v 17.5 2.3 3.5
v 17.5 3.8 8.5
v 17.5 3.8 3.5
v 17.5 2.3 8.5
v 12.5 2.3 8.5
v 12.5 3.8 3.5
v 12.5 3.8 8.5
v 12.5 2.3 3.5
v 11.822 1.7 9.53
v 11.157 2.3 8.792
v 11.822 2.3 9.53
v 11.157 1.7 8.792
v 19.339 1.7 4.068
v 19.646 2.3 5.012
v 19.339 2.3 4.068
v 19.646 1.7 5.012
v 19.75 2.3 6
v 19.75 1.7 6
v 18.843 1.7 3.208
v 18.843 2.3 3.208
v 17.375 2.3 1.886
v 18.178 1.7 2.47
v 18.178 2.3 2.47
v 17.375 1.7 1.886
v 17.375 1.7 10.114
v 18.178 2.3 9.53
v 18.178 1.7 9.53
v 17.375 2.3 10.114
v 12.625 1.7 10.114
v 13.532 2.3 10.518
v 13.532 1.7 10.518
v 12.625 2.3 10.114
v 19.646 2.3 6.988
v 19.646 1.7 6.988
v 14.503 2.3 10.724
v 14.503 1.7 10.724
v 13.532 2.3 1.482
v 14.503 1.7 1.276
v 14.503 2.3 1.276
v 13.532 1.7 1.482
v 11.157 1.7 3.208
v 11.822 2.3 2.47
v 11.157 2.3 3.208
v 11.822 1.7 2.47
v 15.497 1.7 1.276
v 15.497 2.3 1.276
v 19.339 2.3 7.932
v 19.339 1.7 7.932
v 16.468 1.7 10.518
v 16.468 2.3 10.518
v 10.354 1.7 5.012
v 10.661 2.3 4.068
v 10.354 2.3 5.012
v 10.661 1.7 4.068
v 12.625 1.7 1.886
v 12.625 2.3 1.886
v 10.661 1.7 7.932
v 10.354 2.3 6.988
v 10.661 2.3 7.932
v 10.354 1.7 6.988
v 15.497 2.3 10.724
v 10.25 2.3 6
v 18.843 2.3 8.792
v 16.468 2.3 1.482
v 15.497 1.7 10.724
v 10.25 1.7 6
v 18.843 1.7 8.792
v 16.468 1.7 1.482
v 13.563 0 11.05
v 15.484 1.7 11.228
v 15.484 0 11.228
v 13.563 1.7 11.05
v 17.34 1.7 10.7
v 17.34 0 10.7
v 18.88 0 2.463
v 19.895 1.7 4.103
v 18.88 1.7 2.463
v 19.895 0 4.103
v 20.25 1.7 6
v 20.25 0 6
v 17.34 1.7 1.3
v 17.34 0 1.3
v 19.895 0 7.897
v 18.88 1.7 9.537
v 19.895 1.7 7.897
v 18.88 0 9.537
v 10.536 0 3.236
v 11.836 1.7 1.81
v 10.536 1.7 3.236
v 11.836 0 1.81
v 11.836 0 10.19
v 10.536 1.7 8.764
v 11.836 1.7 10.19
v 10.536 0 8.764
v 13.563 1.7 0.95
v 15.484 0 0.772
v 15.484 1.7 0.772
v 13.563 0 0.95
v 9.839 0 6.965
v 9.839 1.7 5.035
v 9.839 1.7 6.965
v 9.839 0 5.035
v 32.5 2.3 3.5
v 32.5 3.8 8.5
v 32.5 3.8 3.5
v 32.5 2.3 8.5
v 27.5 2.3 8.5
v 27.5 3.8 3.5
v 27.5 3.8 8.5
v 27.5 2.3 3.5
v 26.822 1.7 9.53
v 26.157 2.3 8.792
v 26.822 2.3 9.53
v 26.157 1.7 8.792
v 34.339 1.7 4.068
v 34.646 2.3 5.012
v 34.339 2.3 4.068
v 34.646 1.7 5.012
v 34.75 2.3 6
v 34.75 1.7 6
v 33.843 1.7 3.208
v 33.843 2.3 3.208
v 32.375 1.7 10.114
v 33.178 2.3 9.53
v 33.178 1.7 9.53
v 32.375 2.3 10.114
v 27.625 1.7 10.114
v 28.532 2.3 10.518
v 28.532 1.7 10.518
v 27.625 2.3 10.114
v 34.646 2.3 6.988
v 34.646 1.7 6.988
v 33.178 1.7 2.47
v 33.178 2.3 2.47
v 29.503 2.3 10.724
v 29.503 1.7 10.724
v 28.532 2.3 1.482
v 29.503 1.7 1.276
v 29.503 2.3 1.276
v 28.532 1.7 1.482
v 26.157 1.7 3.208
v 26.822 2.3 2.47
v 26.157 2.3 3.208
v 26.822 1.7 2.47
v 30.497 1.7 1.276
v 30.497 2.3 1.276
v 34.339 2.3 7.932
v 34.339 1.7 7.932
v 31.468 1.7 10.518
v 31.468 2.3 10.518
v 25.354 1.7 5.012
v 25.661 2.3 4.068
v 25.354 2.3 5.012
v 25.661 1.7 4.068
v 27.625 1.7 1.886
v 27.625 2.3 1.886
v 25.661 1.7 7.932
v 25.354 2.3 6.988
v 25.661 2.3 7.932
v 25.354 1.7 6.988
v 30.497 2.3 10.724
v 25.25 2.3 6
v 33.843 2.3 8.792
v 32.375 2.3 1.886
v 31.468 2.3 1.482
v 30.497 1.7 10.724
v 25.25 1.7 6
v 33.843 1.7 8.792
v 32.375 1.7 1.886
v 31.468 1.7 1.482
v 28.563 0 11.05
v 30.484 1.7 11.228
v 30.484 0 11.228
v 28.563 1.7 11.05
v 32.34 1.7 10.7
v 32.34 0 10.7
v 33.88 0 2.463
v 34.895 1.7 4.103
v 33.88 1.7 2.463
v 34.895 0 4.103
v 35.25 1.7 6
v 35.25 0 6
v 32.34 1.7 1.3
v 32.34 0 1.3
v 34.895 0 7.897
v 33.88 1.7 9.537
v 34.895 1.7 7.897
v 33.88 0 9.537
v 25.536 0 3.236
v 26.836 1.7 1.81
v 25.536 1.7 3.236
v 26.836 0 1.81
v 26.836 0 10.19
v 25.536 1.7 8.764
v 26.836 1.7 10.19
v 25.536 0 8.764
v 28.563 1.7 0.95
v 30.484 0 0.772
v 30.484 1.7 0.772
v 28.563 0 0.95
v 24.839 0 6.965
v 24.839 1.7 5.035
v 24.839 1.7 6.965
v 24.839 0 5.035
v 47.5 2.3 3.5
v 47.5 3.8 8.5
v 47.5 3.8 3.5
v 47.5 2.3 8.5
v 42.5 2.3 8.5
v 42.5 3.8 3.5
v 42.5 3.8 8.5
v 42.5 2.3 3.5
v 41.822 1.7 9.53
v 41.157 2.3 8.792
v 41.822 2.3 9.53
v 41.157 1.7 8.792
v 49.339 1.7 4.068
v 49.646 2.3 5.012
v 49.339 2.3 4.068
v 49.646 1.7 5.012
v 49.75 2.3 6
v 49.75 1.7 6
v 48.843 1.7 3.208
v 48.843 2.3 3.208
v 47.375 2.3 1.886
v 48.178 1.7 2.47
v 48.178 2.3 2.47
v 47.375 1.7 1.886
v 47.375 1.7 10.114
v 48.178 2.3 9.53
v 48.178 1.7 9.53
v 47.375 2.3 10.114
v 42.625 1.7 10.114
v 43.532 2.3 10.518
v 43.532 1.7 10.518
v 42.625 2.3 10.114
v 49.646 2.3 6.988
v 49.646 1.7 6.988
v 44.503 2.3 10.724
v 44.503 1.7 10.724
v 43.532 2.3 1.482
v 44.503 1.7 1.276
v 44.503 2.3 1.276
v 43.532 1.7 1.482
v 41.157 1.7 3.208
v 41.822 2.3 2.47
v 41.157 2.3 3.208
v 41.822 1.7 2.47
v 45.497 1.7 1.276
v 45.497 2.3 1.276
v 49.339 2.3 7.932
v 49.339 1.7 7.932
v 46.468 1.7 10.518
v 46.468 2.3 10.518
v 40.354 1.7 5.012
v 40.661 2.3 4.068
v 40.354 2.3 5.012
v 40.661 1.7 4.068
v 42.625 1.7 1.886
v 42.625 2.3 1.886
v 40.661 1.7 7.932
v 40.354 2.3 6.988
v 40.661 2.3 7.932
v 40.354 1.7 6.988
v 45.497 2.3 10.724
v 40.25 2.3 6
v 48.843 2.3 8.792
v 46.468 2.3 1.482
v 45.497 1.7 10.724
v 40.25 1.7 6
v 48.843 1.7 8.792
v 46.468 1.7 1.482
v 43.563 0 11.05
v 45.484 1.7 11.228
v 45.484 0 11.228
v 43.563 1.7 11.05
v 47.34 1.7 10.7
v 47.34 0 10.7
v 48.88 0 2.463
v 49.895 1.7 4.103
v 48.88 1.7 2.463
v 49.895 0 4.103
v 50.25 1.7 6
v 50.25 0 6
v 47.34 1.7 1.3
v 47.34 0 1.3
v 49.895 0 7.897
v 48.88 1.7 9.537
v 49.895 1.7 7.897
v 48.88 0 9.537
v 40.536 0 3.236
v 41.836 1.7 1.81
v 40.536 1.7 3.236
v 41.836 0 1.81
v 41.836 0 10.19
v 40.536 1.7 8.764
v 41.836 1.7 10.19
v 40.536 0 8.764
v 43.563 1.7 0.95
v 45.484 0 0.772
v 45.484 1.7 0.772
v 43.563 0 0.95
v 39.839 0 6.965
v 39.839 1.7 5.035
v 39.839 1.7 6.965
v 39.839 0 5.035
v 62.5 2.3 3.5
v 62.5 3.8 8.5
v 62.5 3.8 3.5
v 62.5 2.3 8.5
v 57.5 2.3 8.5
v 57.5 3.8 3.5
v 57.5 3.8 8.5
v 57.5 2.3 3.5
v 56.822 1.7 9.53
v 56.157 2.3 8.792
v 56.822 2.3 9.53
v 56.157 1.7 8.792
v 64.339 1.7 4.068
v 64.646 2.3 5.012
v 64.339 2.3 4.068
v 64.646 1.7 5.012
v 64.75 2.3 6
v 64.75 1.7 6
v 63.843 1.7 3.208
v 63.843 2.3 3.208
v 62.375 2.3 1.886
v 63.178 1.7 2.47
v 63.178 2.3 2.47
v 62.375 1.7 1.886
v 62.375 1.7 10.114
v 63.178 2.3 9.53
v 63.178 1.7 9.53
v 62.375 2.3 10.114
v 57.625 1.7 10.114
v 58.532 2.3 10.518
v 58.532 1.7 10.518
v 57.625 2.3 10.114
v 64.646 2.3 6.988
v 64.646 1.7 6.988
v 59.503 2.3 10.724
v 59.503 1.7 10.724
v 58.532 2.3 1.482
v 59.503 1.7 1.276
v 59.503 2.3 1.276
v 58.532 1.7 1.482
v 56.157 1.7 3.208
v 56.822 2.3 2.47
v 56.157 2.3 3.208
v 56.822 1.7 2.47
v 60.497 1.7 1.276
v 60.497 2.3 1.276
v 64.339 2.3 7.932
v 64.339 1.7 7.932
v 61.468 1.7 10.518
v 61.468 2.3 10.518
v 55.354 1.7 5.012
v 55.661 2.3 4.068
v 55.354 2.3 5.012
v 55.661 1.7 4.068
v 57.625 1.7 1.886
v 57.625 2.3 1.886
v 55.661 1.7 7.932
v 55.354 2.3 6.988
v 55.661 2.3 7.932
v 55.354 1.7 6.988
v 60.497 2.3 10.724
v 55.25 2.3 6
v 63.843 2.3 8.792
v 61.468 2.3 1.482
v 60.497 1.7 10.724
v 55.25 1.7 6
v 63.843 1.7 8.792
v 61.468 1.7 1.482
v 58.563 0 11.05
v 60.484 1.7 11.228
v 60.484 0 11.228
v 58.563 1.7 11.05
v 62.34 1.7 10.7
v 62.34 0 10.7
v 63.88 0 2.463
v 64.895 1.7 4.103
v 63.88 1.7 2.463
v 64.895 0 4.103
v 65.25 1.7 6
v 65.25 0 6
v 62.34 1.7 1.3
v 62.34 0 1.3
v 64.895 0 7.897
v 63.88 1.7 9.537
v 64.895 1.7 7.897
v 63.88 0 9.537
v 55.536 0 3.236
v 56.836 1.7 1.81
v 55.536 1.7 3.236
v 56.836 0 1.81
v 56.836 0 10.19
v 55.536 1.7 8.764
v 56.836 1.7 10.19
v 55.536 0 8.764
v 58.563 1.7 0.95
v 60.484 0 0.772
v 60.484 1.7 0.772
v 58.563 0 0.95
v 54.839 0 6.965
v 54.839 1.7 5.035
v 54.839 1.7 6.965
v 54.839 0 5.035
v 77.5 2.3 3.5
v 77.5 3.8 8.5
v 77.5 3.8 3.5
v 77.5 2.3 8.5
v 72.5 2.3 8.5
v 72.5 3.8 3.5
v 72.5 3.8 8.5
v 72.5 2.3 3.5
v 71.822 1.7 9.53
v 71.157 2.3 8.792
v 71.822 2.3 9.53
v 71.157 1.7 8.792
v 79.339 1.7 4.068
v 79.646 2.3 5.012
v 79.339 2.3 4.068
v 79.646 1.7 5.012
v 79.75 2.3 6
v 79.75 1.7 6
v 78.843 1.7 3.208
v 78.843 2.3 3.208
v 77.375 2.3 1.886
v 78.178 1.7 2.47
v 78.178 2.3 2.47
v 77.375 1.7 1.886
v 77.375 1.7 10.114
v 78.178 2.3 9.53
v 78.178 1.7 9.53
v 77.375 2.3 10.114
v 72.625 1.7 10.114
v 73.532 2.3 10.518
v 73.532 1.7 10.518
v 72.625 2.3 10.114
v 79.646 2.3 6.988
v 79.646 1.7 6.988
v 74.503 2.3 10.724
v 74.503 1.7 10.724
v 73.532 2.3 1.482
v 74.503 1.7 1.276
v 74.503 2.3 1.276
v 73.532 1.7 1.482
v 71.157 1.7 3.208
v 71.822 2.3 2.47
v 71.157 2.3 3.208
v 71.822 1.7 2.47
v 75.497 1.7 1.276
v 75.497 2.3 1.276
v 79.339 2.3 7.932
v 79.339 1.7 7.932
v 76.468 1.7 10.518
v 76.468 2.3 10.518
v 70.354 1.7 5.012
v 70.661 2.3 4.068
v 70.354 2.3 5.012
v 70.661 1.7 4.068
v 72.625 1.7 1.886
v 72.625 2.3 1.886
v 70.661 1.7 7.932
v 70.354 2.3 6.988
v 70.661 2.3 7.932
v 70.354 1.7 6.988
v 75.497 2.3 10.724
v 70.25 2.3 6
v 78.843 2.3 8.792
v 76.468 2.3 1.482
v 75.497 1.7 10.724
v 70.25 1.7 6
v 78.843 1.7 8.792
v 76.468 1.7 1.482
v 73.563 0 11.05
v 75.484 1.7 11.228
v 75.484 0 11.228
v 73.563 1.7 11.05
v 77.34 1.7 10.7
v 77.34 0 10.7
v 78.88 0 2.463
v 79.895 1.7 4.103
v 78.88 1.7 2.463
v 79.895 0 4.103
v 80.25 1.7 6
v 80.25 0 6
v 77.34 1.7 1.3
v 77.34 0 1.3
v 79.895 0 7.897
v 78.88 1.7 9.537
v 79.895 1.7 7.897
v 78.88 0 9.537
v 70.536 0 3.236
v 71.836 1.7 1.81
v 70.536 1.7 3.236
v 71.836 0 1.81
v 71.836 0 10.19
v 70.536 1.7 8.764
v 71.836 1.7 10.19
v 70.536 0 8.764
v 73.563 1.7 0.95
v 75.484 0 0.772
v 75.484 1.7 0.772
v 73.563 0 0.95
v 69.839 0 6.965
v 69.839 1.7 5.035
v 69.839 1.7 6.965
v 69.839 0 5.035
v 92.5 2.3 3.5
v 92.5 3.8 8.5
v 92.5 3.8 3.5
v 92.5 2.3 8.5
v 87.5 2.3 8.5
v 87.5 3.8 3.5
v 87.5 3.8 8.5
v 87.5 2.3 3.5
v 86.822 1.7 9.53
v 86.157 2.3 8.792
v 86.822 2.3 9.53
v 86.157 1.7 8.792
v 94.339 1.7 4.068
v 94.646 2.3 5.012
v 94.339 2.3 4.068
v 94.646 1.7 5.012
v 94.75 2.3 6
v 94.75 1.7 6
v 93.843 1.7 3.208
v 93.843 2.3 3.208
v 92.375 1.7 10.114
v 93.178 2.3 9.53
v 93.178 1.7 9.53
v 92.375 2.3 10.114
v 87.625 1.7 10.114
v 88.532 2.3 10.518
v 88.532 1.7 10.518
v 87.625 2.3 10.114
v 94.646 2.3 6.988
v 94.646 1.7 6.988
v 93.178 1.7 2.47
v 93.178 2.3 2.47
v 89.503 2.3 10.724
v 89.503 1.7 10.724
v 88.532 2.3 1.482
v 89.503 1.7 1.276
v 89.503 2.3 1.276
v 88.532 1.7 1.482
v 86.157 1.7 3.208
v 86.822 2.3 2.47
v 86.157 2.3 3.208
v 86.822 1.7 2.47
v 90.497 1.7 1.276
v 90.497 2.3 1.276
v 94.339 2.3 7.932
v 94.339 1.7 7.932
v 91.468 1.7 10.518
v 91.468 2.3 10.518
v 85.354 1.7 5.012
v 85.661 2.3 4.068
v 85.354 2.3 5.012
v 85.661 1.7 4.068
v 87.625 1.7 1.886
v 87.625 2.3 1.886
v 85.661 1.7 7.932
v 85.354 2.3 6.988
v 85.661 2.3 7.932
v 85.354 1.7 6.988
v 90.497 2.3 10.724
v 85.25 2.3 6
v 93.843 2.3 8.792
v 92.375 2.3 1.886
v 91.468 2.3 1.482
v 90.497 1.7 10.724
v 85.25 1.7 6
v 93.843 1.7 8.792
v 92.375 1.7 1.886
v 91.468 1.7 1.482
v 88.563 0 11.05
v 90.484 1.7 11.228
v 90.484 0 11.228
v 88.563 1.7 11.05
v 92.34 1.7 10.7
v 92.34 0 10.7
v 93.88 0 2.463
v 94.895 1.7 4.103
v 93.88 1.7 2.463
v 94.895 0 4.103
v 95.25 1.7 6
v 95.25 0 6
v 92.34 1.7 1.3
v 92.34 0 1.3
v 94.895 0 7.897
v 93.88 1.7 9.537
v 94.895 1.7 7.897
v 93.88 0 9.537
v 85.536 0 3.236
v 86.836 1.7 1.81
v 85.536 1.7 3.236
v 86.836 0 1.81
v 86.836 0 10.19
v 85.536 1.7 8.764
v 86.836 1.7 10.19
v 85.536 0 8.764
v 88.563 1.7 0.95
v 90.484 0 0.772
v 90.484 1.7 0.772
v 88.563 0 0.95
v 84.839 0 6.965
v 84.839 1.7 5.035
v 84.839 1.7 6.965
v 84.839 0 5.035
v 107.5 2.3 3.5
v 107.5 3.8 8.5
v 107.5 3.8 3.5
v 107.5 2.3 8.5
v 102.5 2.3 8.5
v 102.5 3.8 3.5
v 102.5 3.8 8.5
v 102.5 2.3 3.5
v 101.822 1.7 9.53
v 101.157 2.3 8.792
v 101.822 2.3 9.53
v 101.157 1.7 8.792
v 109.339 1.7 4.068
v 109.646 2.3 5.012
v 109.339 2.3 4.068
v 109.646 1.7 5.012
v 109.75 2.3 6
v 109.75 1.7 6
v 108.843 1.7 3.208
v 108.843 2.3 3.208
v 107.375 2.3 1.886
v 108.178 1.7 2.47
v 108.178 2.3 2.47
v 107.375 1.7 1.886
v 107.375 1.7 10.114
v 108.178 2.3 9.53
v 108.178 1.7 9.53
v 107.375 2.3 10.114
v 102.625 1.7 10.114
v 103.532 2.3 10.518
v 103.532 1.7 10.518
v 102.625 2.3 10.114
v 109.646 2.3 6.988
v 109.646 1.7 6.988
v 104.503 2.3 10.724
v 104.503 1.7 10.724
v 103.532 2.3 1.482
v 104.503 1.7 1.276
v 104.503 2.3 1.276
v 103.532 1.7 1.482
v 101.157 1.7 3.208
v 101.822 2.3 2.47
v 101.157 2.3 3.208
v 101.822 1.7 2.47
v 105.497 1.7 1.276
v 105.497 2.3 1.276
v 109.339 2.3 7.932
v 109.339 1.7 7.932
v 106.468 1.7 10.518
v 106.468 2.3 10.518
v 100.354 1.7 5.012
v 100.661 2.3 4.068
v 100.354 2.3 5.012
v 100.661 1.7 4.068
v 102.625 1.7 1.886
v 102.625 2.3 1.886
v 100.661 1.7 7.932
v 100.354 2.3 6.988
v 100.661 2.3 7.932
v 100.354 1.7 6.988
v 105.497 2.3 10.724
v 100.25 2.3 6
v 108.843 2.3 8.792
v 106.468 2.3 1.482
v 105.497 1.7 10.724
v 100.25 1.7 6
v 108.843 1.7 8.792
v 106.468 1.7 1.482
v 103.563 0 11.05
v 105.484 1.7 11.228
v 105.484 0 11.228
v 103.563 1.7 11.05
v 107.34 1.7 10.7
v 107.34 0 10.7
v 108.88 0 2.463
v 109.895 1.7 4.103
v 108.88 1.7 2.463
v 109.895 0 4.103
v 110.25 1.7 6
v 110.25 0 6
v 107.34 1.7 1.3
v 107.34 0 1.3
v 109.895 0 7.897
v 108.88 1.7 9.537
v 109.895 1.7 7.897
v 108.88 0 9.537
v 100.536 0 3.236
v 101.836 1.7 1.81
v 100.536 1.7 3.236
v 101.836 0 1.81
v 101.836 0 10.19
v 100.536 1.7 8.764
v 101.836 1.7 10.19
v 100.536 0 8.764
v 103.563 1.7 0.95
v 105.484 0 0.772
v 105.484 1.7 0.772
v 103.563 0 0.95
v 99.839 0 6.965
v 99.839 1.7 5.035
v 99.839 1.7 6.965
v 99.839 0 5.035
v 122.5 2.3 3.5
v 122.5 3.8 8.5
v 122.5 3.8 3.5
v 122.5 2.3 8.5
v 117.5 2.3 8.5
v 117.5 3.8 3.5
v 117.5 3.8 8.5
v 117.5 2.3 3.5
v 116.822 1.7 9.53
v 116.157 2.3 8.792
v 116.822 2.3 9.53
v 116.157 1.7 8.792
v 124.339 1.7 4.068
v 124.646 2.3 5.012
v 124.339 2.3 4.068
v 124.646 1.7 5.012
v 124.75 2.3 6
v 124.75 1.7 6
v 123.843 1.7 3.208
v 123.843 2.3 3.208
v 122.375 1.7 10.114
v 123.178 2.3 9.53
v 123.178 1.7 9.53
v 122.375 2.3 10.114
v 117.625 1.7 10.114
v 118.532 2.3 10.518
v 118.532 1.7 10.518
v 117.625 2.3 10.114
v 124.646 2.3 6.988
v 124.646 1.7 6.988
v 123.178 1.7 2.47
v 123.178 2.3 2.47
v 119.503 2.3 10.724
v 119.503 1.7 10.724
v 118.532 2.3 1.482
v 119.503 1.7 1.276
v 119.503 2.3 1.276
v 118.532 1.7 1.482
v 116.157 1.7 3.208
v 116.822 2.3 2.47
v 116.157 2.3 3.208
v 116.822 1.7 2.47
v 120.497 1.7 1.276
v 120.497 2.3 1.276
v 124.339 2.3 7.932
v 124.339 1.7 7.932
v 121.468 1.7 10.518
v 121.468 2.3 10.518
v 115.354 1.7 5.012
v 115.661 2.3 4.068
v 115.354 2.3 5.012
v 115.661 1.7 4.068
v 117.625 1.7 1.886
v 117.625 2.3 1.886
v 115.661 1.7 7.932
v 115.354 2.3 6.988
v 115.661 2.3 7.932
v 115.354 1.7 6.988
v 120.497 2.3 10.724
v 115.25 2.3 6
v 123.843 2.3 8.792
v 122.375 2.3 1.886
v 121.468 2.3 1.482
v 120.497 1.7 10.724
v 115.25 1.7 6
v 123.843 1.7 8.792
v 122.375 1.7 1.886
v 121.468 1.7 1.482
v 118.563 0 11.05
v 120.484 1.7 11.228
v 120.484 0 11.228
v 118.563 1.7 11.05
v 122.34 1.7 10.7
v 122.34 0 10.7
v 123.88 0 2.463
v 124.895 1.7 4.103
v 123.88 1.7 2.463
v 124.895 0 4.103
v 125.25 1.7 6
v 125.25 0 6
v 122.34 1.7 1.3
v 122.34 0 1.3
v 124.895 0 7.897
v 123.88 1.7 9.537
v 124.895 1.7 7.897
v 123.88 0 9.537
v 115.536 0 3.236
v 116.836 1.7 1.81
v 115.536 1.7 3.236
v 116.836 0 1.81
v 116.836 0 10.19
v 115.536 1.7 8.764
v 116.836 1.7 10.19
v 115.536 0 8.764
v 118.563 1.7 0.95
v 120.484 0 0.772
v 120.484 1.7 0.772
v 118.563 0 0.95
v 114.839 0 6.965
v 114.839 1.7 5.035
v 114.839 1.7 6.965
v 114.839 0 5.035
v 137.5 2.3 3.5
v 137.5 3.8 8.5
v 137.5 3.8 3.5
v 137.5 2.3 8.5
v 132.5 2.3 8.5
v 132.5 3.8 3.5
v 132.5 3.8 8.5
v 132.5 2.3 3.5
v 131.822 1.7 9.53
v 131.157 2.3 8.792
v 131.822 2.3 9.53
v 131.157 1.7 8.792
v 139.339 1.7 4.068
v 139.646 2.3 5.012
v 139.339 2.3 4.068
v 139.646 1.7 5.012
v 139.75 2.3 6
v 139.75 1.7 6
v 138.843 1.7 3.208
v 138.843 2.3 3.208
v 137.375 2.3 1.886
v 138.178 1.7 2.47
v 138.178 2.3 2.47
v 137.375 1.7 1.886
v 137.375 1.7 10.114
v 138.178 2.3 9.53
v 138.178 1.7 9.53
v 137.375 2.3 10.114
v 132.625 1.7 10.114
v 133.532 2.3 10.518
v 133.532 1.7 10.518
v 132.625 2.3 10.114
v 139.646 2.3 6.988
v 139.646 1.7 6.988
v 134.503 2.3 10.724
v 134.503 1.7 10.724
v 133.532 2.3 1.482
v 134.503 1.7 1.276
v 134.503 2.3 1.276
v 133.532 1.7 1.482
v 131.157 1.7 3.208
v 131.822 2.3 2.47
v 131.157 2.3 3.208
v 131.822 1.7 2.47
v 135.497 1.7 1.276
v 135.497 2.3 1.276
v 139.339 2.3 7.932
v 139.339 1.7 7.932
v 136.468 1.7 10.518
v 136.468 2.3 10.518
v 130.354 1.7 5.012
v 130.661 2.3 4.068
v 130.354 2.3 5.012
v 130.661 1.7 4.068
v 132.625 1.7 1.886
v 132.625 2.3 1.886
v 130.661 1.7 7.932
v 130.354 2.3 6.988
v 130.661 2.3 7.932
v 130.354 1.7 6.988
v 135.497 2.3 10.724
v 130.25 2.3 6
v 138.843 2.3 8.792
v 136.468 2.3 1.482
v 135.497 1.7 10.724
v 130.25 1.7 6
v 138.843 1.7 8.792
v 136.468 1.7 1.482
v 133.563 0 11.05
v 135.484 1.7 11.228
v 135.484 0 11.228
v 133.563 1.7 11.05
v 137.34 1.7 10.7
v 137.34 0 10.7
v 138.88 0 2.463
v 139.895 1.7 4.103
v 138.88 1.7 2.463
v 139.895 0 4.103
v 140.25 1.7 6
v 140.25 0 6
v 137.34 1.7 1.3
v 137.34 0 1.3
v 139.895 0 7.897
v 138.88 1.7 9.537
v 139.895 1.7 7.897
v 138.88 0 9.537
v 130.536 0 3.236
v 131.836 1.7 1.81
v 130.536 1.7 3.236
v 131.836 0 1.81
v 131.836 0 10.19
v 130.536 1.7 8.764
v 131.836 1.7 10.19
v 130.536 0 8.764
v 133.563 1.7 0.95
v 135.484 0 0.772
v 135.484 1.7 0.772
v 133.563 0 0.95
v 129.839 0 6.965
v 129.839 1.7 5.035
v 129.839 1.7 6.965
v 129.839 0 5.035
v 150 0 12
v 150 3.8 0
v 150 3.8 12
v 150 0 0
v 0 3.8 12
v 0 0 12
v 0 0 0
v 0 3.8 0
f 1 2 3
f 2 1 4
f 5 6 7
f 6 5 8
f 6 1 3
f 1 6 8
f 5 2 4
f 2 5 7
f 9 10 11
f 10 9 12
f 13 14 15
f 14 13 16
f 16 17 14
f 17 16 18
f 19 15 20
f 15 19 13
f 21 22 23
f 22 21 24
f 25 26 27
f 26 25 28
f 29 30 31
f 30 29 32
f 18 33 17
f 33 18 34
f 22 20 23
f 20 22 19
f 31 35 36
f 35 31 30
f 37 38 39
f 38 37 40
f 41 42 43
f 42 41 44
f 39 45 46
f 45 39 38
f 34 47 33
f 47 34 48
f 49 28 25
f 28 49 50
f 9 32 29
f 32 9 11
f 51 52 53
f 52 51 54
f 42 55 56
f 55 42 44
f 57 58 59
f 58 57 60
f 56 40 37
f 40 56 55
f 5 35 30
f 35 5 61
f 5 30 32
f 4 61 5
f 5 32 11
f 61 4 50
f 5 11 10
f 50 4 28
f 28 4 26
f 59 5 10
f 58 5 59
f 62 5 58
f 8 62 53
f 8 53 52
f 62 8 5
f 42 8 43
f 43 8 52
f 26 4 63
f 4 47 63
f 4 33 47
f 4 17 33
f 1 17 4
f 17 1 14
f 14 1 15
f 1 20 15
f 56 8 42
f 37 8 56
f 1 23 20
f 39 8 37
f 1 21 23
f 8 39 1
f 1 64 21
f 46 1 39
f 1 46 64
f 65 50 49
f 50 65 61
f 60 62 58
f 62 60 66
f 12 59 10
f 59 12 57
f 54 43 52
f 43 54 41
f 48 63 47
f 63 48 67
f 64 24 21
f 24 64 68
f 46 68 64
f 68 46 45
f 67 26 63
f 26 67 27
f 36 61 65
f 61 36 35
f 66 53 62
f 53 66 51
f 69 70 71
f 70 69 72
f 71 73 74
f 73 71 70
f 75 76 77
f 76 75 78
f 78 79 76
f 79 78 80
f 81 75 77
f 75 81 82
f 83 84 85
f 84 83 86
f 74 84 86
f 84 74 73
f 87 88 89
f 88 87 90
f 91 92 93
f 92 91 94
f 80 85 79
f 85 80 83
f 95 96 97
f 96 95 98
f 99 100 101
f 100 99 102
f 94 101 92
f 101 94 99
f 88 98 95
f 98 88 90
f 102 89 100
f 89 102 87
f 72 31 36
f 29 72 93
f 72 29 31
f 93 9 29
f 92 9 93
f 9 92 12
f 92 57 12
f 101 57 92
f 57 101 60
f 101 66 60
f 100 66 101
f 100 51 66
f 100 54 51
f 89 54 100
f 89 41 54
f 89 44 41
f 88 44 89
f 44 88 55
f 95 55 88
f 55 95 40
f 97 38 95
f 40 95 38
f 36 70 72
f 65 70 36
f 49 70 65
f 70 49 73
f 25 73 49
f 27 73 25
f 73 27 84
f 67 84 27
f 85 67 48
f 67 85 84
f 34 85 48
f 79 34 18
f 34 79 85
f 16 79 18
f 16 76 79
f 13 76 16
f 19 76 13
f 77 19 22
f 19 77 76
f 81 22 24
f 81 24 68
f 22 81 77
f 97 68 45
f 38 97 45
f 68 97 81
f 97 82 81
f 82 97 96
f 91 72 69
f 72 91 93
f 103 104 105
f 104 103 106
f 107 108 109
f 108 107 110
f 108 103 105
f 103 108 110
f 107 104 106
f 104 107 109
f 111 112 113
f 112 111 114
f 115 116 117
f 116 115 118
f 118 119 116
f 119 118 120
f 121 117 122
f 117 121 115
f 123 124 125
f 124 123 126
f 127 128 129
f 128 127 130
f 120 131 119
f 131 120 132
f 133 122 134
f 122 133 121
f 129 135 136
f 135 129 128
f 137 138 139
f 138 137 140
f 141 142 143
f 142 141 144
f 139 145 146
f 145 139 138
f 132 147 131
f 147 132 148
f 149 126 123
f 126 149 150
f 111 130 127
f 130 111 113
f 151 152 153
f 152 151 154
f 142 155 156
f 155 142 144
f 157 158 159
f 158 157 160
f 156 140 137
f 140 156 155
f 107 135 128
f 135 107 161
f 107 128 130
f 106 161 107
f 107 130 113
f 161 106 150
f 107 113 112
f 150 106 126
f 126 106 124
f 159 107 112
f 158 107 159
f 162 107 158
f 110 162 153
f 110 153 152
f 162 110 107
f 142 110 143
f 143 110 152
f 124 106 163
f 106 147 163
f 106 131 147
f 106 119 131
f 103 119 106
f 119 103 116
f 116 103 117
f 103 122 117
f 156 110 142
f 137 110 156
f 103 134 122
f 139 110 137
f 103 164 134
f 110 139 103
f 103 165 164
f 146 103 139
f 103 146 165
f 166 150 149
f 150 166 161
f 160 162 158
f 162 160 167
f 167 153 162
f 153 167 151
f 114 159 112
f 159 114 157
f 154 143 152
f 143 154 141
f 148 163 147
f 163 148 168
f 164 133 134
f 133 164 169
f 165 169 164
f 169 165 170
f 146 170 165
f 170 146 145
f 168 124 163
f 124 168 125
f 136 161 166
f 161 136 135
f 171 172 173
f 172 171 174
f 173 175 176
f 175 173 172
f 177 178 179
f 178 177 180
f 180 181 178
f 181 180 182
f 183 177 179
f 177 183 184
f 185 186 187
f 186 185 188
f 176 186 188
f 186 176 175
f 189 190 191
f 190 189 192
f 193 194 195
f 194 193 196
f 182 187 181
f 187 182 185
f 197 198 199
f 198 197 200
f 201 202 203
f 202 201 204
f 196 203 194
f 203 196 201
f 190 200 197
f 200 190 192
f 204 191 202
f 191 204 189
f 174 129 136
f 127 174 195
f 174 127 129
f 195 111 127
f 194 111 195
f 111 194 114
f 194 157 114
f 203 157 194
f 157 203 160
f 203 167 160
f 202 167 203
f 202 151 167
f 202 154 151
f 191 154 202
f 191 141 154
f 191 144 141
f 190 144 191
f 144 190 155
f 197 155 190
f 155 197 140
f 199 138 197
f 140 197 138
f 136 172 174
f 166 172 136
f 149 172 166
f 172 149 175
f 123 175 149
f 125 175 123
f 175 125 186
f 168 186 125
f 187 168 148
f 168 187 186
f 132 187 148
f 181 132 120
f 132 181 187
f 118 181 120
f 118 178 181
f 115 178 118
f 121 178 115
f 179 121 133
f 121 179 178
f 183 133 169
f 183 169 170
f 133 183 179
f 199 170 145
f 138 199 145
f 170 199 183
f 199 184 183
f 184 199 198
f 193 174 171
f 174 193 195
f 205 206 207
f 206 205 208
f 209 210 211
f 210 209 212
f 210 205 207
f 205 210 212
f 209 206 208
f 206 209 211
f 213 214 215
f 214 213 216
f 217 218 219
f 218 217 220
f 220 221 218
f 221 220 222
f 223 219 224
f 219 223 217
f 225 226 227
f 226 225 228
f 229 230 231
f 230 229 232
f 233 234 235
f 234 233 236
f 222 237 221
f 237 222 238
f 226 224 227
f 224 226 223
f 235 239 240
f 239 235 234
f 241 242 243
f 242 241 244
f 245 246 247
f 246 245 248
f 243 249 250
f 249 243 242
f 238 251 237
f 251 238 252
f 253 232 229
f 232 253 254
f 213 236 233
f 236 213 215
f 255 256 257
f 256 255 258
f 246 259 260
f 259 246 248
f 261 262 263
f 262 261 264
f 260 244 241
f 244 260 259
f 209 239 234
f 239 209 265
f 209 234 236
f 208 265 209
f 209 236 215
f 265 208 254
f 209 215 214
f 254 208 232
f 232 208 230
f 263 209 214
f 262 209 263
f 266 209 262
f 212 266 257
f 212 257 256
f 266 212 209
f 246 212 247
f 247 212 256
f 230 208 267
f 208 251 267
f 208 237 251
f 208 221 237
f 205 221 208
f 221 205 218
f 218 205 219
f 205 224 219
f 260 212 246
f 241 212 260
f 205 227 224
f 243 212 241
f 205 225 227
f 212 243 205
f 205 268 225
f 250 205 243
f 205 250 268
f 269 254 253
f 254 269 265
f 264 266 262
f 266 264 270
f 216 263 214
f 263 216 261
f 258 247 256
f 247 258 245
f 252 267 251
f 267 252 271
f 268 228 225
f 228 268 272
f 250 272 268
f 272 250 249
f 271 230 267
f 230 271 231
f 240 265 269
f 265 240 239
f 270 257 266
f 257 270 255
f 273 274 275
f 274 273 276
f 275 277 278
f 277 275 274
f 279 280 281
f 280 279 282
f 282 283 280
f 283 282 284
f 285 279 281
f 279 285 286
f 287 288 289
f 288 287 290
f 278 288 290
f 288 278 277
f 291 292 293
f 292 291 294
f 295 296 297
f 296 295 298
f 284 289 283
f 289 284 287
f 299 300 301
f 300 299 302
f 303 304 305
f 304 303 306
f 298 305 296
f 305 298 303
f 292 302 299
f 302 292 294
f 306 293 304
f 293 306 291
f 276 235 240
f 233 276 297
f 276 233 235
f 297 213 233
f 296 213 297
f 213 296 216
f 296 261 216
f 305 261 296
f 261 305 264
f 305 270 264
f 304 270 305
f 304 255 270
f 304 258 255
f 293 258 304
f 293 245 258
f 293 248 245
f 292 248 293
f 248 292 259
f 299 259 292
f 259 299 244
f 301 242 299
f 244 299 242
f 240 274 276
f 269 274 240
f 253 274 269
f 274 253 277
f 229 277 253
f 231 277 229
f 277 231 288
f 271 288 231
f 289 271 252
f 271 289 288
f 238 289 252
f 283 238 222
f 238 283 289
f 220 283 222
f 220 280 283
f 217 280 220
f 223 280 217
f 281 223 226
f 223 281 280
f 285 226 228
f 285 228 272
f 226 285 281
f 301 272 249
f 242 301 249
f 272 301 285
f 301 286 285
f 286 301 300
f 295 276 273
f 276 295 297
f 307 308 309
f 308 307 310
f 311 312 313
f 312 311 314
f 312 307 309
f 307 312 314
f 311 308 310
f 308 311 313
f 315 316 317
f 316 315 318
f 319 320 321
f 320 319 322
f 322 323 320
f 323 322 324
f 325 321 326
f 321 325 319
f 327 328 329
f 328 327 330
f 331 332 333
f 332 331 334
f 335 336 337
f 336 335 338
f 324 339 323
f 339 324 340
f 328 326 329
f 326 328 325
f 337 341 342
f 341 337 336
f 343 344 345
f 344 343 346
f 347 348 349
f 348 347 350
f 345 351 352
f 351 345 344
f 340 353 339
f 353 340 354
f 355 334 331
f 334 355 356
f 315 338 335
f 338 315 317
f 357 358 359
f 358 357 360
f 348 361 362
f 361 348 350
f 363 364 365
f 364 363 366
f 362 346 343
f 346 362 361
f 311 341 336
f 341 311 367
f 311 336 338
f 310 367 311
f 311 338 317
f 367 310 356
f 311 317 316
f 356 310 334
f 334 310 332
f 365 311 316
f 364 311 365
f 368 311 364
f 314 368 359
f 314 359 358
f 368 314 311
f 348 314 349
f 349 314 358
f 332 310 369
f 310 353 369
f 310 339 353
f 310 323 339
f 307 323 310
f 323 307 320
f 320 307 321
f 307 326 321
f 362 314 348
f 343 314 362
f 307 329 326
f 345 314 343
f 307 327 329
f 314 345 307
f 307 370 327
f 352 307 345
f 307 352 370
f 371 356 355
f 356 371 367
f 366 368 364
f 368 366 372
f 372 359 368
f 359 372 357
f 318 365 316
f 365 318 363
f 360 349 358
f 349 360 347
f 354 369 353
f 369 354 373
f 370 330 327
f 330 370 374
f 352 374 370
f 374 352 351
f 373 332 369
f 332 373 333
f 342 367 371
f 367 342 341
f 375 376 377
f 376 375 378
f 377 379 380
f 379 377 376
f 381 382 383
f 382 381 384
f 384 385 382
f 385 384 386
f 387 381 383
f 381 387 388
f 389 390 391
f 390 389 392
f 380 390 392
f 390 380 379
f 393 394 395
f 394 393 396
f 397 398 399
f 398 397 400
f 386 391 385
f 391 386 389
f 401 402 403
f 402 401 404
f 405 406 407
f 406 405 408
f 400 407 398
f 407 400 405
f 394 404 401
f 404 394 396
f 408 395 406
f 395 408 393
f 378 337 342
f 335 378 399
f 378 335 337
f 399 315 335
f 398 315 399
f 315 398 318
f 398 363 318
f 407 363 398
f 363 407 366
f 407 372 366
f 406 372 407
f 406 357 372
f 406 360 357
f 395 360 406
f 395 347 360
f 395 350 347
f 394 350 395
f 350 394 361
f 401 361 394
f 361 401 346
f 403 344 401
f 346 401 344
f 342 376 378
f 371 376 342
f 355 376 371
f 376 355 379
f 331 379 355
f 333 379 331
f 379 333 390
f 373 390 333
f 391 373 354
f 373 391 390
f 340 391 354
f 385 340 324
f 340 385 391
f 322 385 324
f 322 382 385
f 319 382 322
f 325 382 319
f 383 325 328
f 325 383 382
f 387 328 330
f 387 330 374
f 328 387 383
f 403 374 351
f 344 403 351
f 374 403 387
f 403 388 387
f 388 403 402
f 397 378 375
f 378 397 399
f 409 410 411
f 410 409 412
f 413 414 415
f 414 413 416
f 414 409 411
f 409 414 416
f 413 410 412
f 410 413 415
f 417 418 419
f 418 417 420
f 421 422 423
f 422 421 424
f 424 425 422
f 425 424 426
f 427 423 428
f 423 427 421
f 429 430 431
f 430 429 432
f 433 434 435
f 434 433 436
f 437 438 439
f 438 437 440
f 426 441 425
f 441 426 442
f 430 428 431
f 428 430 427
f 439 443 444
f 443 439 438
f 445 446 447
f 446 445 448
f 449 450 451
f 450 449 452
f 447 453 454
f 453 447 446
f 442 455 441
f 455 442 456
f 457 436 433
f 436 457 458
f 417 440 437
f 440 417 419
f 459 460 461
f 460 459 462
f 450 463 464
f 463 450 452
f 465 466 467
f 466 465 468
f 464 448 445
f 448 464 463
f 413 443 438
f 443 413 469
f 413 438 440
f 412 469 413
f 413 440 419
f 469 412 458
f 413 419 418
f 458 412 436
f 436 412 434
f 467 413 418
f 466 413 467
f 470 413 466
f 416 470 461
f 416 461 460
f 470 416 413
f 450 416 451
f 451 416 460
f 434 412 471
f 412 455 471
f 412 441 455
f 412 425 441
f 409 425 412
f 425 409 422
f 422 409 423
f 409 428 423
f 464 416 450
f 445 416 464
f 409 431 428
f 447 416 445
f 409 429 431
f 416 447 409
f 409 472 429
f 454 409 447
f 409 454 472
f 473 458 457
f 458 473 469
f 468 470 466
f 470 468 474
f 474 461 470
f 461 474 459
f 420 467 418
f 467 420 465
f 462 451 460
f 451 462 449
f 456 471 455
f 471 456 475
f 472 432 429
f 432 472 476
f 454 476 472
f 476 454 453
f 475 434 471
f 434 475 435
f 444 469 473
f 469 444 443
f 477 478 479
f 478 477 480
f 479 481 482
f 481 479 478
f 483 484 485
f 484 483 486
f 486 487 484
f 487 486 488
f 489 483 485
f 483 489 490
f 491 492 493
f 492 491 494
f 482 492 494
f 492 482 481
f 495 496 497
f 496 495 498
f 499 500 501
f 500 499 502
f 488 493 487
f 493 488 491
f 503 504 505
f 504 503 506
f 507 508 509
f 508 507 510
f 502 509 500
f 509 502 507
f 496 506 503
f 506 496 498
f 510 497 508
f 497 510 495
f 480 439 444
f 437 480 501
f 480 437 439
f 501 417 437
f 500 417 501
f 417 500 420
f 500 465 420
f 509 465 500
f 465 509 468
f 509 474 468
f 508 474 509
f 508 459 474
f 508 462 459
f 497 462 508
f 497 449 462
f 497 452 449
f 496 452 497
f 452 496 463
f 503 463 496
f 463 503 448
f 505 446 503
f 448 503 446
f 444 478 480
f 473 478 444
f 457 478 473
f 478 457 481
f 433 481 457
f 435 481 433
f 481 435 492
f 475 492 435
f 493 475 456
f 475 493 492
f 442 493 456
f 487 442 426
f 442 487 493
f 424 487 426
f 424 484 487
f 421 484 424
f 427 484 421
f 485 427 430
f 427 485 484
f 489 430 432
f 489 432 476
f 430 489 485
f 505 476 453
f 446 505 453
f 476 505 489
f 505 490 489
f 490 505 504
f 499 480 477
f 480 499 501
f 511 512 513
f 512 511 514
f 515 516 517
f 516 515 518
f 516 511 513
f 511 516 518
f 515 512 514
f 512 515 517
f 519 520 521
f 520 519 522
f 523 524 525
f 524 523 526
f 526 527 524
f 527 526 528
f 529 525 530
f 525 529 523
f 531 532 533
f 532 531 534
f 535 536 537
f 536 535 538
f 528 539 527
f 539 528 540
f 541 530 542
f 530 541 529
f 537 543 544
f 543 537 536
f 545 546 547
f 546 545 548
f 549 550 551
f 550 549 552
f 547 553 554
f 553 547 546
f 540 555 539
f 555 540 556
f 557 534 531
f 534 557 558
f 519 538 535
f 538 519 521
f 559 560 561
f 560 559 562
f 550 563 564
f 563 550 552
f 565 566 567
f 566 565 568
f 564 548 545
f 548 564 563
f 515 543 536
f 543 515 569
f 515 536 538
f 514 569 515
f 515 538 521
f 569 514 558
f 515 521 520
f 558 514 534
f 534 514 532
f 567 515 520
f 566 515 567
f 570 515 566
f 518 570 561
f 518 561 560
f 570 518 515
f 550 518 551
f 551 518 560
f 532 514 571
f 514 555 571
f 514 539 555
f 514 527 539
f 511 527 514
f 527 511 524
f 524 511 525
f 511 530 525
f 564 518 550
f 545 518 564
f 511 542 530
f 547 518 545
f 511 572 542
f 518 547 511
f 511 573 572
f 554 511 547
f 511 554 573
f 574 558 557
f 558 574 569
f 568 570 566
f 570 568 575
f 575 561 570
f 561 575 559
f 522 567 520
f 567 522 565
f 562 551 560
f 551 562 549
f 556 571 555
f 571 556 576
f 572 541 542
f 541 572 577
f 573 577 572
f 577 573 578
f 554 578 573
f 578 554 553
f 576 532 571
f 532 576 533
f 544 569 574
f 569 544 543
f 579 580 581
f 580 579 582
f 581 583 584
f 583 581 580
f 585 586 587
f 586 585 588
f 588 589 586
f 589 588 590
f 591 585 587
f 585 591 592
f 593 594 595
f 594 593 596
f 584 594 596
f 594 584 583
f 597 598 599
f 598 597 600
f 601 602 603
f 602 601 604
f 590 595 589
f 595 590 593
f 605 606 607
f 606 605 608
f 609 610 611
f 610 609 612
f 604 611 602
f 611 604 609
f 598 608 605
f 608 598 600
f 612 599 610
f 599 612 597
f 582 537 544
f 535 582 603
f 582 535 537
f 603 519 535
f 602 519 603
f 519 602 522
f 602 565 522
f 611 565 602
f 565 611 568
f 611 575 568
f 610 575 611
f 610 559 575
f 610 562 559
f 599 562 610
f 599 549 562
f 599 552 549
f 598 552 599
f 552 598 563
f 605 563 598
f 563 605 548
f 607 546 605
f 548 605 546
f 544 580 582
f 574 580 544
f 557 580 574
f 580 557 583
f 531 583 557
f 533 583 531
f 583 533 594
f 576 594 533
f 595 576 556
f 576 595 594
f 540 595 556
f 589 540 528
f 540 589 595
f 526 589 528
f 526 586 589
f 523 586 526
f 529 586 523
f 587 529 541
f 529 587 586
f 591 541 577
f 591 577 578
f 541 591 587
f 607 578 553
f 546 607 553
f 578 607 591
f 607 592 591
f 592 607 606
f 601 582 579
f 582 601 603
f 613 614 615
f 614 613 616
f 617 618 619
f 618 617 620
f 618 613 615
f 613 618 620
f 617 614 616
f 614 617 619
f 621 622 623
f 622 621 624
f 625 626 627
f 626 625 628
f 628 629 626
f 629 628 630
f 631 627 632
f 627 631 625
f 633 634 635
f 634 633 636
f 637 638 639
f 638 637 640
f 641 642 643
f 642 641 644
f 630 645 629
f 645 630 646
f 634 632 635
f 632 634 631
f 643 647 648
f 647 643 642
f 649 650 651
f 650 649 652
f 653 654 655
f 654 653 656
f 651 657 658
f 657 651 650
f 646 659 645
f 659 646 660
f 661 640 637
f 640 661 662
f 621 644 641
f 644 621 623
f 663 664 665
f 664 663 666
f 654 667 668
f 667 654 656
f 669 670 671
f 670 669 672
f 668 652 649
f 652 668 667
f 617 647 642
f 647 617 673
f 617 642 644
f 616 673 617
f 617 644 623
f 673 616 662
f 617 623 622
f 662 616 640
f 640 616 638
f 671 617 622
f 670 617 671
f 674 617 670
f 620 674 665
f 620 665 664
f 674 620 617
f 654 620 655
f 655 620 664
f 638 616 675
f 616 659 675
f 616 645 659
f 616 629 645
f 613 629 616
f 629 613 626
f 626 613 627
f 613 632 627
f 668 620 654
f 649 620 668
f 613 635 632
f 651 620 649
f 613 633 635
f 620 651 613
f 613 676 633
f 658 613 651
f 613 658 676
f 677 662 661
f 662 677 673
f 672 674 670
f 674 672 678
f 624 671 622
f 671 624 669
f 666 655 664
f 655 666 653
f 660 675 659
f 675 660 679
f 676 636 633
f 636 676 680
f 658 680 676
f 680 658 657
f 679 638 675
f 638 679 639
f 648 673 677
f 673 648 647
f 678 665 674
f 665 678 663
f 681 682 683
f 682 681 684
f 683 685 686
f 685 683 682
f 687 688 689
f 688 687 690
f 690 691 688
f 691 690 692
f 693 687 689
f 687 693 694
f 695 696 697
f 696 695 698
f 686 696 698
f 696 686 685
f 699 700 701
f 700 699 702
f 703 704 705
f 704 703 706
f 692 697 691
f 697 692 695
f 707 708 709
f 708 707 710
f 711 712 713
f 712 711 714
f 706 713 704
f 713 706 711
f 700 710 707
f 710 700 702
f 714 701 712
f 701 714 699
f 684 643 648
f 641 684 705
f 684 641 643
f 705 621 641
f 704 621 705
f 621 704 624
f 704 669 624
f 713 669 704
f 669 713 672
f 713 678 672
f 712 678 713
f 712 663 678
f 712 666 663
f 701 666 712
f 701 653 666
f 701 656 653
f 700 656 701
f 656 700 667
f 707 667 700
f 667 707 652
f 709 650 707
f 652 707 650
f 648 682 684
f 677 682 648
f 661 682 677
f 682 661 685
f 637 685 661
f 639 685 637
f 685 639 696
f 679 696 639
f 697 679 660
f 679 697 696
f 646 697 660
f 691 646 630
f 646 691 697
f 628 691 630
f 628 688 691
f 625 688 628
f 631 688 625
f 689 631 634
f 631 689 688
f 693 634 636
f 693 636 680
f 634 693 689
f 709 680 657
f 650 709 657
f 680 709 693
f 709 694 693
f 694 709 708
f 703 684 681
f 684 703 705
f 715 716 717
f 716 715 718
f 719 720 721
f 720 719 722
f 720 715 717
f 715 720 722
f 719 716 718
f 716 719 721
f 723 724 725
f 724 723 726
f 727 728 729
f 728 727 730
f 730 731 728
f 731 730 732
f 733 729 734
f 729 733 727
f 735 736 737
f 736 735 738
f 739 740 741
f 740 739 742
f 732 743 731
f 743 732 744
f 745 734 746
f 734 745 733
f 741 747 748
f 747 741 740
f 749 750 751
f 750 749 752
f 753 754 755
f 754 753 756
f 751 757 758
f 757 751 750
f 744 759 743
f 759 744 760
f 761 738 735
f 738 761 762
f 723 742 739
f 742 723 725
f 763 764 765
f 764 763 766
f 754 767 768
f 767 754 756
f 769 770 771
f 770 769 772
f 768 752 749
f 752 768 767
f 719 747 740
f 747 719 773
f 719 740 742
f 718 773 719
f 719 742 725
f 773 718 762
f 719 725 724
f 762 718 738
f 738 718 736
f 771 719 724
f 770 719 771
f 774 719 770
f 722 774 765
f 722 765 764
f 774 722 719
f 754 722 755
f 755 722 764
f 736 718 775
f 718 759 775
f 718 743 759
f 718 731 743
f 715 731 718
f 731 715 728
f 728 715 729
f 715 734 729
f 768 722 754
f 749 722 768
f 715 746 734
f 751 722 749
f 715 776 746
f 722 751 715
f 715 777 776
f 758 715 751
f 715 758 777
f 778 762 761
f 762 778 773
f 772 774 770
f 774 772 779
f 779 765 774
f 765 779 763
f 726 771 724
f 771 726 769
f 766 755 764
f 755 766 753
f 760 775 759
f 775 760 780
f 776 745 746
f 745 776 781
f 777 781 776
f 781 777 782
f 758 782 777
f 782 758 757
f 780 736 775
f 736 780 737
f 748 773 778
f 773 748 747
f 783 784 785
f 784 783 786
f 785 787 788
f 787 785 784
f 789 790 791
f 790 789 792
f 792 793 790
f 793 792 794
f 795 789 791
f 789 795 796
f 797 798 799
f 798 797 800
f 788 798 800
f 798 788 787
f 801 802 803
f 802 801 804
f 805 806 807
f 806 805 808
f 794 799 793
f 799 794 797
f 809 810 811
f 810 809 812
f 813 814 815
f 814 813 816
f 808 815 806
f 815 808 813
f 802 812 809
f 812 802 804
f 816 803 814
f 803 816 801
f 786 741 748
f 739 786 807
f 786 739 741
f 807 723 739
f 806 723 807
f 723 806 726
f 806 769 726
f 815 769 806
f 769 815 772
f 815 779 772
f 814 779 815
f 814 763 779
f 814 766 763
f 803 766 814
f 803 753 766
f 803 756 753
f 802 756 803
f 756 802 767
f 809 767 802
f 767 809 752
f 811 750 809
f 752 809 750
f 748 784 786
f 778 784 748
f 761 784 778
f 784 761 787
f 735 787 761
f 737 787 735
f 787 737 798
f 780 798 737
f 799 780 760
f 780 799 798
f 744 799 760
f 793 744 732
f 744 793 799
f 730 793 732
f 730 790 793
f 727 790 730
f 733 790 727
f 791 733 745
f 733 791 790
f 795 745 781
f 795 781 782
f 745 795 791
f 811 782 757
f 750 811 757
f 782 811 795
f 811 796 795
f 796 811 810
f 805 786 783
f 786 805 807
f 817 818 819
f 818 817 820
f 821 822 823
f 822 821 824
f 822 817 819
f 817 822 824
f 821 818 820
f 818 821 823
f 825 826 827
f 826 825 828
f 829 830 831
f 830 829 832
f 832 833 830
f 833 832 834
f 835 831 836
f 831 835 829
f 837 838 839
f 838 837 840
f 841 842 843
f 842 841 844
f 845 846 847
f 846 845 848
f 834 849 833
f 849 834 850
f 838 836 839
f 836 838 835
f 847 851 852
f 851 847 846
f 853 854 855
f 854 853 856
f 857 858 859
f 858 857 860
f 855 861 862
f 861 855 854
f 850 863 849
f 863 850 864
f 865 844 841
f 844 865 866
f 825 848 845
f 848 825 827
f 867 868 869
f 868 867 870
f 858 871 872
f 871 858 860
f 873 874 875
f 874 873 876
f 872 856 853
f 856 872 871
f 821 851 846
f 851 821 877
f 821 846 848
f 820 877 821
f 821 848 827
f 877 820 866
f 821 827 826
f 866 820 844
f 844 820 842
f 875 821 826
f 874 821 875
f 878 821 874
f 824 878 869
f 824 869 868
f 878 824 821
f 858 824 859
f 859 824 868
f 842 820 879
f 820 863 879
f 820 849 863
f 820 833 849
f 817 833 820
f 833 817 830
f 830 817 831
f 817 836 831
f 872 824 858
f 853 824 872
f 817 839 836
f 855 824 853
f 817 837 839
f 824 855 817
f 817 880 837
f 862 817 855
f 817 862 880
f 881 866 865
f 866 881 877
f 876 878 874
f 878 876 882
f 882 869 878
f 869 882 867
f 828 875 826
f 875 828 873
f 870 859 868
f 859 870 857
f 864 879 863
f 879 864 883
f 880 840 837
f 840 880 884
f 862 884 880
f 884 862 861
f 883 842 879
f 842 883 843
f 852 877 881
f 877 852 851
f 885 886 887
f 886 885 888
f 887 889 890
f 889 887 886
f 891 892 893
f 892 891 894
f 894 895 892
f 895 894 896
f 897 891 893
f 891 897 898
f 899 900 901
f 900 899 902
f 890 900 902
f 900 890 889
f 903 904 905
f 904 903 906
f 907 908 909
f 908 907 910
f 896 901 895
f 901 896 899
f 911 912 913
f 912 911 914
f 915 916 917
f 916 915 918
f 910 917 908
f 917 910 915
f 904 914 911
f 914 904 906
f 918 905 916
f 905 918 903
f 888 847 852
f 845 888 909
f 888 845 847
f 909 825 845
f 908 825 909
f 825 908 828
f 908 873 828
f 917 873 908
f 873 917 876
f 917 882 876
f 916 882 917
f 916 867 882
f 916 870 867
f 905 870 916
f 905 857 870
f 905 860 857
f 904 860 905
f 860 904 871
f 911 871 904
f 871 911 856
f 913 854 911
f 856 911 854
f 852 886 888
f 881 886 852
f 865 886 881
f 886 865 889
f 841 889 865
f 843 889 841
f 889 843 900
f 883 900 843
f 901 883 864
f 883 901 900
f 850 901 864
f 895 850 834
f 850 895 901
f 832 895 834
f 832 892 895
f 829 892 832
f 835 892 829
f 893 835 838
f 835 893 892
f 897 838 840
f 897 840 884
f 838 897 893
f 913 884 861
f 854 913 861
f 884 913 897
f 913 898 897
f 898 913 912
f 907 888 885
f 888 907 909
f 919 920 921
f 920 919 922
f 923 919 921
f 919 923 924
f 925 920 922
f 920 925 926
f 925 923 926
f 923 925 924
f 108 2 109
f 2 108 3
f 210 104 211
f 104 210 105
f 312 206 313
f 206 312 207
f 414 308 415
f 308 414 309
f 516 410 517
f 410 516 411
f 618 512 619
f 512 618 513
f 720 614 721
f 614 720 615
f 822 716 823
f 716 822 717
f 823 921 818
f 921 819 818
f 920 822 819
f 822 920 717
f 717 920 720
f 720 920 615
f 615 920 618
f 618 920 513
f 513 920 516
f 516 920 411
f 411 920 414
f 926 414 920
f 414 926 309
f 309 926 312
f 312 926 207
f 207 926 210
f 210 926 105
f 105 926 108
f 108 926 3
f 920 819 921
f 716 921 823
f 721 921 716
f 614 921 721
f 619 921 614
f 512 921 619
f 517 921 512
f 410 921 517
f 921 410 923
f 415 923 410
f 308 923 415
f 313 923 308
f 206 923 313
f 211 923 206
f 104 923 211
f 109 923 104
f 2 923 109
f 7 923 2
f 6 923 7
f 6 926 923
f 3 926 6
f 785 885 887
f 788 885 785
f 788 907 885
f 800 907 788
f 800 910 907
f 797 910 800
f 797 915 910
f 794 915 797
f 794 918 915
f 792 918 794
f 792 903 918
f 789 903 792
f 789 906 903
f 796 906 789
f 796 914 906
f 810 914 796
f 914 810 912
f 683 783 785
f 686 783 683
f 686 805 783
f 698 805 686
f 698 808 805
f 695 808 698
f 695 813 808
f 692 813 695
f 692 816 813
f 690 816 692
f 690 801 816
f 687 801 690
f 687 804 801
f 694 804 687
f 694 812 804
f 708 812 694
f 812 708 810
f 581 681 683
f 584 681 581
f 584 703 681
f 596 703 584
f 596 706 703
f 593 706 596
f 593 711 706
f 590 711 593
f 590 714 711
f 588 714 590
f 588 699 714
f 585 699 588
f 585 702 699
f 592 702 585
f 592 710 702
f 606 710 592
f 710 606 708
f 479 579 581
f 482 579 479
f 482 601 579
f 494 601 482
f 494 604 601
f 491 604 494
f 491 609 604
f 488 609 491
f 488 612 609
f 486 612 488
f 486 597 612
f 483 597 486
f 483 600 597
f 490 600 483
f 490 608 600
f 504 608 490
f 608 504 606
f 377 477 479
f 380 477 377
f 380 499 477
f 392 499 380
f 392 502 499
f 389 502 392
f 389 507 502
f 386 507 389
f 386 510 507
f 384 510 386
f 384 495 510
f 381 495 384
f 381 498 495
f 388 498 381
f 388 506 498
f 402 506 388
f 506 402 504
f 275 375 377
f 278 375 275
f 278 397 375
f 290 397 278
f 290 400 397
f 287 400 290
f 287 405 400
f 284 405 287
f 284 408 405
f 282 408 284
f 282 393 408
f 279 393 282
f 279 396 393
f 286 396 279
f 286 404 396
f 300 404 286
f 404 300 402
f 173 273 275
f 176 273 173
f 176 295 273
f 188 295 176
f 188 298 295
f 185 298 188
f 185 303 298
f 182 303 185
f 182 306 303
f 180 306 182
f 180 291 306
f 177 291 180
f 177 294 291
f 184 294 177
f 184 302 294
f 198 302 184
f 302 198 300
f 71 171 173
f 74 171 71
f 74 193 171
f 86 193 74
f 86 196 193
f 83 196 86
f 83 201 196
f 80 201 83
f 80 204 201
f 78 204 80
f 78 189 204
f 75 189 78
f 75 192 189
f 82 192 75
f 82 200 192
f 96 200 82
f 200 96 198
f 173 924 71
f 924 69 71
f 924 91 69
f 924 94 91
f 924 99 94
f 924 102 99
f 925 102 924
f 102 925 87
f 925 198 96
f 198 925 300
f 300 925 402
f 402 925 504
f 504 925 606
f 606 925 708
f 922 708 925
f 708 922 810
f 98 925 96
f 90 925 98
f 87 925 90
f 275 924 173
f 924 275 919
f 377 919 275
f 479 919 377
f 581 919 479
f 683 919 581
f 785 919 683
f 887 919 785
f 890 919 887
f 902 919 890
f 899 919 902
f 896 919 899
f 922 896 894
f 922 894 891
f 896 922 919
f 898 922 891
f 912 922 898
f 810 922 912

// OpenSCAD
// file: ../lib/neo_pixel.scad
///< Alitovo Neo pixel RGB X000UCVKBH 2812b-1-LED-WH
use <../lib/math.scad>;
use <../lib/utils.scad>;

///< Parameters - Begin
led_assembly_h = 2.8;
led_assembly_d = 9.5;

///< Diameter of the PCB 
pcb_d = 9.5;
pcb_h = 1.2;

///< Demensions of the LED IC
led_w = 5;
led_d = led_w;
led_h = led_assembly_h - pcb_h;


///< Modules
module pcb(){
     ///< LED PCB definition
     color( rand_clr() )cylinder( h=pcb_h, d=pcb_d, $fn = 30 );
}

module led(){
     ///< Neo pixel LED (2812b-1)
     union(){
         color( rand_clr() )cube( [ led_w, led_d, led_h ] );
         color( rand_clr() )
              translate([led_w/2,led_d/2, 0] )
              cylinder( h=led_h, d= led_w, $fn = 30 );
         }
}

module neo_pixel(){
     ///< Assembly of the led and pcb_pad
     union(){
          translate([-led_w/2,-led_d/2,pcb_h-0.01])led();
          pcb();
          }

}

///< Build object
///< Remove this when including
//neo_pixel();
// file: ../lib/utils.scad
///< Utilities

function rand_clr() = rands( 0,1,3 );

///< Length conversions
function in2mm( i ) = ( i * 25.4 ); 
function mm2in( m ) = ( m / 25.4 );

/// This is pulled from stackoverflow
/// https://stackoverflow.com/questions/45826208/openscad-rotating-around-a-particular-point

// rotate as per a, v, but around point pt
module rotate_about_pt(a, v, pt) {
    translate(pt)
        rotate(a,v)
            translate(-pt)
                children();   
}

function adjust_z_offset( v, z ) = [for (i=[0:(len(v)-1)]) v[i]+[0,0,z]] ;

///< For each child, translate child by <p> point in points
module foreach_translate(points ){
	for (p=points){
		translate(p) children();
	}
}
// file: ../lib/math.scad
///< Math scad module


///< Find the hypotenuse from two sides of a right triangle
function hyp_from_sides( a, b ) = sqrt( pow( a, 2 ) + pow( b, 2 ) );

///< Find equal sides from hypotenuse of a right triangle
function sides_from_hyp(h) = sqrt( pow( h, 2 ) / 2 );

///< Find A from hypotenuse and B
function a_from_hb( h, b ) = sqrt( pow( h, 2 ) - pow( b, 2 ) );

function dist_2d( pt2, pt1 ) = sqrt(pow(( pt2[0]-pt1[0] ),2) + pow(( pt2[1]-pt1[1]),2) );

function mid_pt_2d( pt2, pt1 ) = [( pt1[0]+pt2[0] )/2, ( pt1[1]+pt2[1] )/2, 0 ];

function opposite_side_th( theta, hypotenuse ) = sin( theta )*hypotenuse ;
function adjacent_side_th( theta, hypotenuse ) = cos( theta )*hypotenuse ;

///< Test for math functions

A = 3;
B = 4;
echo("Given A=", A, "and B=", B );
H = hyp_from_sides( A, B );
echo("Hypotenuse=", H );
echo("Calc Correct = ", (H == 5) );

echo("Given H=", H, " which is a hypotenuse with equal sides" );
echo( "the sides=", sides_from_hyp( H ) );

echo("Given H=", H, "B=", 4 );
echo("A=", a_from_hb( H, 4 ) );

echo("Distance from [-1,1] and [3,4] = ", dist_2d( [-1,1],[3,4]) );

echo( "Opposite = ", opposite_side_th( 39.0, 30 ), "Theta = ", 39.0, "Hypotenuse = ", 30 );
echo( "Adjacent = ", adjacent_side_th( 60.0, 10 ), "Theta = ", 60.0, "Hypotenuse = ", 10 );

///< Find the sum of a vector <vect> starting from <s> and continuing to <i>
function sumv( vect, i, s=0 ) = ( i == s ? vect[ i ] : vect[ i ] + sumv( vect, i - 1, s ) );
vec = [ 1, 2, 3, 4 ];
l = len( vec )-1;
echo( "Sum vec = ", sumv( vec, l, 0 ) );

///< Find the average of a vector <vect> starting at <s>
function average( vect, s=0 ) = (len( vect ) == 0 ? 0 : ( sumv( vect, len( vect ) - 1, s )/len(vect) ) );
echo( "Ave vec = ", average( vec ) );
vec2 = [];
echo( "Ave vec2 = ", average( vec2 ) );
// main file
///< LED frame for the neo pixel array
use <../lib/math.scad>;
use <../lib/utils.scad>;
include <../lib/neo_pixel.scad>

///< Parameters
frame_w      = 150;
pcb_socket_d = led_assembly_d + 1;
pcb_socket_h = 1.0;
frame_d      = led_assembly_h+pcb_socket_h;//-led_assembly_h*0.04;
frame_h      = pcb_socket_d+1.5;
num_leds     = 10;

///< Modules
module led_frame( width, depth, height ){
     //union(){
     difference(){
          cube( [width, depth, height] );
          led_spacing_w = width/( num_leds );

          ///< Make x number of slots
          for (i = [0:num_leds]){
               offset_spacing = (( i * led_spacing_w ) + ( led_spacing_w ));
               remaining = width - offset_spacing;
               if( remaining >= led_spacing_w ){
                    translate( [ offset_spacing, (pcb_socket_h+0.1), height/2 ] )
                         rotate( [ -90, 0, 0 ])
                         color( rand_clr() )
                         neo_pixel(h=pcb_h+0.1, d=pcb_socket_d);
                    translate( [ offset_spacing, -0.5, height/2 ] )
                        rotate( [ -90, 0, 0 ])
                        color( rand_clr() )
                        cylinder( h=pcb_h+pcb_socket_h, d = pcb_socket_d );

               }
          }
     }
}

///< Build object
echo( "Frame height:", frame_h, "depth:", frame_d, "width:", frame_w );
led_frame( frame_w, frame_d, frame_h );
